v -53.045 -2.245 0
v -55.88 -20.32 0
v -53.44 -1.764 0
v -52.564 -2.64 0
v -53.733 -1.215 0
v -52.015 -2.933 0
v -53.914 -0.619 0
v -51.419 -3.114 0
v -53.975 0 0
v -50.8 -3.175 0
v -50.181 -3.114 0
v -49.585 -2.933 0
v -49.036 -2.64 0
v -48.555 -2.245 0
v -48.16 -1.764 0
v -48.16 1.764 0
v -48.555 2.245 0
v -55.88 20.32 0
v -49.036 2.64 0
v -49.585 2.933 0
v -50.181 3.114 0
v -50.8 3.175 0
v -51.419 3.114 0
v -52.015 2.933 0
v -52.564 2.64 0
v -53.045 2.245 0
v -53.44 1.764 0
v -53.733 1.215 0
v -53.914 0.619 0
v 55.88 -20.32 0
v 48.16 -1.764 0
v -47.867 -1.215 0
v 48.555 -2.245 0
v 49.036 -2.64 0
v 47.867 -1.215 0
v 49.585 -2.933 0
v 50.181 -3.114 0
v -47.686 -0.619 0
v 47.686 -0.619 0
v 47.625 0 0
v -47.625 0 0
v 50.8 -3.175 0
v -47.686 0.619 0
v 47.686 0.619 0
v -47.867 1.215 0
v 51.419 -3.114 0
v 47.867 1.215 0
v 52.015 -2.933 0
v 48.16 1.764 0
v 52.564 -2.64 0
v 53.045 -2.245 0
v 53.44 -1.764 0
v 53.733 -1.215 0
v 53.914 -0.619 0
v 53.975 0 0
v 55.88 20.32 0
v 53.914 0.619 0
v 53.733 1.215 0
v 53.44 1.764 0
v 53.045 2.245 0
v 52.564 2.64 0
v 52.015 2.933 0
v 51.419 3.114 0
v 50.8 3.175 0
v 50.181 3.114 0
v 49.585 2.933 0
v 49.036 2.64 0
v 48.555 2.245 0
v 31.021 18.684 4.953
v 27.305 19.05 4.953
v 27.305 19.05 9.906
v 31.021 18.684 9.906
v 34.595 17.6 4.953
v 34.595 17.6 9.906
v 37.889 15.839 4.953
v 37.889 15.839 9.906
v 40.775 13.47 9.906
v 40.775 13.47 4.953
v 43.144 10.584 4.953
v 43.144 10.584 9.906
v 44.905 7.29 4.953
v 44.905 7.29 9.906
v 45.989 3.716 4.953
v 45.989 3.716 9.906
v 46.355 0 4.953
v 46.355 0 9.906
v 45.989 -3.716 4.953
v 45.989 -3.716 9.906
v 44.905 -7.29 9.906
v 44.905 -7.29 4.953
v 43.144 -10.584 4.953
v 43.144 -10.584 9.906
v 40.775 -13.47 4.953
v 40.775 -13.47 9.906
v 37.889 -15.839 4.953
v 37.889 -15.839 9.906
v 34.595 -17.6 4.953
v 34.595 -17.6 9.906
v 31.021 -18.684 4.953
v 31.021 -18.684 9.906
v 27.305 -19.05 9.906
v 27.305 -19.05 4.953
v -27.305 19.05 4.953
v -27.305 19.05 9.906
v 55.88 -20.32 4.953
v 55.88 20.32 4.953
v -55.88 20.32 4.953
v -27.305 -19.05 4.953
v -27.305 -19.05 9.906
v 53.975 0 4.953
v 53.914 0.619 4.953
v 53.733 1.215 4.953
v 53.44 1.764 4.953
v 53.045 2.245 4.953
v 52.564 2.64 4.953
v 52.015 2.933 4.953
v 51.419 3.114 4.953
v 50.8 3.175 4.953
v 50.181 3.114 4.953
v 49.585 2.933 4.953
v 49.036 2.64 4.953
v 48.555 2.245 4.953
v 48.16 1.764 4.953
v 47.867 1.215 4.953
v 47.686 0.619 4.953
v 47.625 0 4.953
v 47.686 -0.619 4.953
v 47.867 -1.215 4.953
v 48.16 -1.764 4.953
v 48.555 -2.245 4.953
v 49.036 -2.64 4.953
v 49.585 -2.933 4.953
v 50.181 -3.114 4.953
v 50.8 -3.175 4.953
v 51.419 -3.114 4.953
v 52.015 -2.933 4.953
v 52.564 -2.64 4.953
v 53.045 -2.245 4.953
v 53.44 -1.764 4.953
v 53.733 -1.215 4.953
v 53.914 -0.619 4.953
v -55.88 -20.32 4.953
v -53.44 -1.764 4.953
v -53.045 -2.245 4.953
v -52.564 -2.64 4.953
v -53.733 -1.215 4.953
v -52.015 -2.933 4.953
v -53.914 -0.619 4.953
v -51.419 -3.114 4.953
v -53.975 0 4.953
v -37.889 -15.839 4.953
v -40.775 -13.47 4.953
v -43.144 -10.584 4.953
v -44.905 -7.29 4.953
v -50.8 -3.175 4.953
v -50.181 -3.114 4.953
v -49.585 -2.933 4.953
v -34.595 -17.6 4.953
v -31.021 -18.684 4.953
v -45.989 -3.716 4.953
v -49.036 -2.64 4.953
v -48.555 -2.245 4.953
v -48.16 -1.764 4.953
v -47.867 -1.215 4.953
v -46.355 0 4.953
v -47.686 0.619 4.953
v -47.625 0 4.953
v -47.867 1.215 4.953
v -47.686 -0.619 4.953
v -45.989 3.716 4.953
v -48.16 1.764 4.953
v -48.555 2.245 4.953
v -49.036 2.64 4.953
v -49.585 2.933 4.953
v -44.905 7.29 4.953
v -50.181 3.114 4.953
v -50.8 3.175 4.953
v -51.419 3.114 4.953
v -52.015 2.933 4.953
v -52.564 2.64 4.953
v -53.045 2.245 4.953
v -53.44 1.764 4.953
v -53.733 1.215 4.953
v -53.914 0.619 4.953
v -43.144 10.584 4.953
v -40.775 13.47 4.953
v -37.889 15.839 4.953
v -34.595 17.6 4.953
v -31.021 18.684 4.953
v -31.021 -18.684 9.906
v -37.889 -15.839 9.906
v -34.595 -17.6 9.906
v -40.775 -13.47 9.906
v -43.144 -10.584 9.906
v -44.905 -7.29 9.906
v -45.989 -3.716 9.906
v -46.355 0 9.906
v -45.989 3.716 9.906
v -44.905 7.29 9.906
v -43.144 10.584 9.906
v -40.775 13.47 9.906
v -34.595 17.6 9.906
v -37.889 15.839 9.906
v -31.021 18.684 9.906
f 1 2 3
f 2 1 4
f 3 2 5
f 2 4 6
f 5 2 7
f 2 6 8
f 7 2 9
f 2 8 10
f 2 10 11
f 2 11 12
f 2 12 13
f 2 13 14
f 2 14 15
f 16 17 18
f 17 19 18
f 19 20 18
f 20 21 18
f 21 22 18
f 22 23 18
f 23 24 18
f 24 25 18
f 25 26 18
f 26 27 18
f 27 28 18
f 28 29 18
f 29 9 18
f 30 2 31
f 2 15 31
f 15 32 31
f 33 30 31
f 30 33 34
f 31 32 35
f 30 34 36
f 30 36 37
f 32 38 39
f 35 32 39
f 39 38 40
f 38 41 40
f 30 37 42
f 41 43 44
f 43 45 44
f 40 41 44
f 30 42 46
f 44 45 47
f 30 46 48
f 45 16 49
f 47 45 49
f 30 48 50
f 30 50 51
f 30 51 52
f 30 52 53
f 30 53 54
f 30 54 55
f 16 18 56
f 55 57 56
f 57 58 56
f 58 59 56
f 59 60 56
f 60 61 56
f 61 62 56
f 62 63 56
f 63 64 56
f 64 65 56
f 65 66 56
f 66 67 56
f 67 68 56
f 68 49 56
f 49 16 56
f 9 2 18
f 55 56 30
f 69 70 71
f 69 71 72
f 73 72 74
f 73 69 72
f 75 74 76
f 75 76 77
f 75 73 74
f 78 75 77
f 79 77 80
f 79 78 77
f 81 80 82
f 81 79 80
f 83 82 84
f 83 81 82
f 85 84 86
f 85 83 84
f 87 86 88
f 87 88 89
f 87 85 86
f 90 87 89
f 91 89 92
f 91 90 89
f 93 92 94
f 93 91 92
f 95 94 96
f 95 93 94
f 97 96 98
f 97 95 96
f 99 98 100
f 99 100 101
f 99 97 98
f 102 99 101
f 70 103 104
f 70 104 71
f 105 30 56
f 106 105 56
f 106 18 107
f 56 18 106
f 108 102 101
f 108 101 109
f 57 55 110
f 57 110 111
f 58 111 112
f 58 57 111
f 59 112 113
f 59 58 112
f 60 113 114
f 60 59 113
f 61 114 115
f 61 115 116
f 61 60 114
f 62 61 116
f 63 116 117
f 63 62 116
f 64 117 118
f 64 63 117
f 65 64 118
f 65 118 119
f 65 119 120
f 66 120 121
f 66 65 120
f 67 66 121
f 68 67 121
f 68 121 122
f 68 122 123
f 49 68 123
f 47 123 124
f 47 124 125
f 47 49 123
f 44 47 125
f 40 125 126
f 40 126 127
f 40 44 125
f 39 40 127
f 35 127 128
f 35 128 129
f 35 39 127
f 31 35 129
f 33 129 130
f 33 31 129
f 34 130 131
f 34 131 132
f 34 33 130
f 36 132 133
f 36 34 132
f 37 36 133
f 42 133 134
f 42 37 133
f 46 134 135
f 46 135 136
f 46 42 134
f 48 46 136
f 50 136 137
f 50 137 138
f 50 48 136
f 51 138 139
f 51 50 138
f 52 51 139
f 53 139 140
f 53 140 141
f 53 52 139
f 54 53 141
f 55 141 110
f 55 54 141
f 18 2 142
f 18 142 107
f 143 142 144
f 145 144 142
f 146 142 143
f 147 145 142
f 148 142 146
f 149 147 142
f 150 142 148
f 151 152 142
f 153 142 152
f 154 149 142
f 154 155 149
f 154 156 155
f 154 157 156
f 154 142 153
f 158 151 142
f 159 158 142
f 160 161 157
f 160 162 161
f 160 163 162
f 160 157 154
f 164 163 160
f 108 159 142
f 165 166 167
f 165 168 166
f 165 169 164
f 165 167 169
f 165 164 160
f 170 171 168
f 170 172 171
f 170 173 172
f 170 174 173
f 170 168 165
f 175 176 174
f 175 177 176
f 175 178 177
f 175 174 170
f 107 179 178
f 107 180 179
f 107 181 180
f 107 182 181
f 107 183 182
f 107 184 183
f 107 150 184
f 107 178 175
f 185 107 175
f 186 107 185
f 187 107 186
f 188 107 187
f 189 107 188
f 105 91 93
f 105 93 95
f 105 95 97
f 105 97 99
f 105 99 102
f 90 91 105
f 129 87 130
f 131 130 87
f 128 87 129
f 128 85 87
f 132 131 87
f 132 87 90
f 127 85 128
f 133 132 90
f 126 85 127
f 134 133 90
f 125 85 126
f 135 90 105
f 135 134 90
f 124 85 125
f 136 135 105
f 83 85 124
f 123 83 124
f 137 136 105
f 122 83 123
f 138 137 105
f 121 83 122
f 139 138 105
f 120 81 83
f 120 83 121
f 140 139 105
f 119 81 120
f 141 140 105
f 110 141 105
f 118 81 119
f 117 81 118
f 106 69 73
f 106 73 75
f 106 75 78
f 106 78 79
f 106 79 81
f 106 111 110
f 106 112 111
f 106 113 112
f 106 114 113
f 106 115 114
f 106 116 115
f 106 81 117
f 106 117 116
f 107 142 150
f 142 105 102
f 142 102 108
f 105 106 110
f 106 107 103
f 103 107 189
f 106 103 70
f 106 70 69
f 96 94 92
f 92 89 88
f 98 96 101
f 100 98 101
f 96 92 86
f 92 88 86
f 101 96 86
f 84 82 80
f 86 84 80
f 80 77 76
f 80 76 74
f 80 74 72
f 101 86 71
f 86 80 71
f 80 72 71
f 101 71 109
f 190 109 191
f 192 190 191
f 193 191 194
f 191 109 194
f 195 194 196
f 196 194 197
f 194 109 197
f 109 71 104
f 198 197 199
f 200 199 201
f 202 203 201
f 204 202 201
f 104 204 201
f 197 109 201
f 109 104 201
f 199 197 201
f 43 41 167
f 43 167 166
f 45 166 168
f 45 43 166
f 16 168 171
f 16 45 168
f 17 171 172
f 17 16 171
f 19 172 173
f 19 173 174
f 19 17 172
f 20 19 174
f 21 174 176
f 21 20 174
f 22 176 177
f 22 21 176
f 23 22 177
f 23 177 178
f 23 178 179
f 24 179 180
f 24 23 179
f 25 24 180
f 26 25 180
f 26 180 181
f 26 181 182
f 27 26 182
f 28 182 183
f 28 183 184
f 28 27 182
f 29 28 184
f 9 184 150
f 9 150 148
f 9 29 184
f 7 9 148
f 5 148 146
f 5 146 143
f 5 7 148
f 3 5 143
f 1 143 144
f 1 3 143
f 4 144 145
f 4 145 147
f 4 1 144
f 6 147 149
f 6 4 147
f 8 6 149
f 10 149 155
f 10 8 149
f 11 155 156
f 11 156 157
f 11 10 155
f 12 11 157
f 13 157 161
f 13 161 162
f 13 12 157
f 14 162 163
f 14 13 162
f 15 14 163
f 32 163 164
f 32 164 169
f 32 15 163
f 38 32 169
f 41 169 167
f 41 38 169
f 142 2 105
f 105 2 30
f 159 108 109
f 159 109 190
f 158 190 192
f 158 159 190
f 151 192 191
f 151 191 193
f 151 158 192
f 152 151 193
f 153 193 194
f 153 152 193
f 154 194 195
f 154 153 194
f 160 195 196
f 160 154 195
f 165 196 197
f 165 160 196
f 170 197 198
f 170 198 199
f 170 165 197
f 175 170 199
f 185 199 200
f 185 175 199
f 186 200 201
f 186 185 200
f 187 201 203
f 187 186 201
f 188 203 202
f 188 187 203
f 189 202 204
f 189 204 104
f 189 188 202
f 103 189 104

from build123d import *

# Parameters (mm, degrees)
SKETCH2_W            = 111.76
SKETCH2_H            = 40.64
SKETCH2_R            = 3.175
BOSS_EXTRUDE13_DEPTH = 4.953
BOSS_EXTRUDE14_DEPTH = 4.953


with BuildPart() as part:
    # Sketch2 → Boss-Extrude13 (new body)
    with BuildSketch(Plane.XY):
        Rectangle(SKETCH2_W, SKETCH2_H)
        with Locations((50.8, 0)):
            Circle(SKETCH2_R, mode=Mode.SUBTRACT)
        with Locations((-50.8, 0)):
            Circle(SKETCH2_R, mode=Mode.SUBTRACT)
    extrude(amount=BOSS_EXTRUDE13_DEPTH)

    # Sketch3 → Boss-Extrude14 (add)
    with BuildSketch(Plane.XY.offset(4.953)):
        with BuildLine():
            Line((27.305, -19.05), (-27.305, -19.05))
            ThreePointArc((-27.305, -19.05), (-46.355, 0), (-27.305, 19.05))
            Line((-27.305, 19.05), (27.305, 19.05))
            ThreePointArc((27.305, 19.05), (46.355, 0), (27.305, -19.05))
        make_face()
    extrude(amount=BOSS_EXTRUDE14_DEPTH)


solid = part.part
